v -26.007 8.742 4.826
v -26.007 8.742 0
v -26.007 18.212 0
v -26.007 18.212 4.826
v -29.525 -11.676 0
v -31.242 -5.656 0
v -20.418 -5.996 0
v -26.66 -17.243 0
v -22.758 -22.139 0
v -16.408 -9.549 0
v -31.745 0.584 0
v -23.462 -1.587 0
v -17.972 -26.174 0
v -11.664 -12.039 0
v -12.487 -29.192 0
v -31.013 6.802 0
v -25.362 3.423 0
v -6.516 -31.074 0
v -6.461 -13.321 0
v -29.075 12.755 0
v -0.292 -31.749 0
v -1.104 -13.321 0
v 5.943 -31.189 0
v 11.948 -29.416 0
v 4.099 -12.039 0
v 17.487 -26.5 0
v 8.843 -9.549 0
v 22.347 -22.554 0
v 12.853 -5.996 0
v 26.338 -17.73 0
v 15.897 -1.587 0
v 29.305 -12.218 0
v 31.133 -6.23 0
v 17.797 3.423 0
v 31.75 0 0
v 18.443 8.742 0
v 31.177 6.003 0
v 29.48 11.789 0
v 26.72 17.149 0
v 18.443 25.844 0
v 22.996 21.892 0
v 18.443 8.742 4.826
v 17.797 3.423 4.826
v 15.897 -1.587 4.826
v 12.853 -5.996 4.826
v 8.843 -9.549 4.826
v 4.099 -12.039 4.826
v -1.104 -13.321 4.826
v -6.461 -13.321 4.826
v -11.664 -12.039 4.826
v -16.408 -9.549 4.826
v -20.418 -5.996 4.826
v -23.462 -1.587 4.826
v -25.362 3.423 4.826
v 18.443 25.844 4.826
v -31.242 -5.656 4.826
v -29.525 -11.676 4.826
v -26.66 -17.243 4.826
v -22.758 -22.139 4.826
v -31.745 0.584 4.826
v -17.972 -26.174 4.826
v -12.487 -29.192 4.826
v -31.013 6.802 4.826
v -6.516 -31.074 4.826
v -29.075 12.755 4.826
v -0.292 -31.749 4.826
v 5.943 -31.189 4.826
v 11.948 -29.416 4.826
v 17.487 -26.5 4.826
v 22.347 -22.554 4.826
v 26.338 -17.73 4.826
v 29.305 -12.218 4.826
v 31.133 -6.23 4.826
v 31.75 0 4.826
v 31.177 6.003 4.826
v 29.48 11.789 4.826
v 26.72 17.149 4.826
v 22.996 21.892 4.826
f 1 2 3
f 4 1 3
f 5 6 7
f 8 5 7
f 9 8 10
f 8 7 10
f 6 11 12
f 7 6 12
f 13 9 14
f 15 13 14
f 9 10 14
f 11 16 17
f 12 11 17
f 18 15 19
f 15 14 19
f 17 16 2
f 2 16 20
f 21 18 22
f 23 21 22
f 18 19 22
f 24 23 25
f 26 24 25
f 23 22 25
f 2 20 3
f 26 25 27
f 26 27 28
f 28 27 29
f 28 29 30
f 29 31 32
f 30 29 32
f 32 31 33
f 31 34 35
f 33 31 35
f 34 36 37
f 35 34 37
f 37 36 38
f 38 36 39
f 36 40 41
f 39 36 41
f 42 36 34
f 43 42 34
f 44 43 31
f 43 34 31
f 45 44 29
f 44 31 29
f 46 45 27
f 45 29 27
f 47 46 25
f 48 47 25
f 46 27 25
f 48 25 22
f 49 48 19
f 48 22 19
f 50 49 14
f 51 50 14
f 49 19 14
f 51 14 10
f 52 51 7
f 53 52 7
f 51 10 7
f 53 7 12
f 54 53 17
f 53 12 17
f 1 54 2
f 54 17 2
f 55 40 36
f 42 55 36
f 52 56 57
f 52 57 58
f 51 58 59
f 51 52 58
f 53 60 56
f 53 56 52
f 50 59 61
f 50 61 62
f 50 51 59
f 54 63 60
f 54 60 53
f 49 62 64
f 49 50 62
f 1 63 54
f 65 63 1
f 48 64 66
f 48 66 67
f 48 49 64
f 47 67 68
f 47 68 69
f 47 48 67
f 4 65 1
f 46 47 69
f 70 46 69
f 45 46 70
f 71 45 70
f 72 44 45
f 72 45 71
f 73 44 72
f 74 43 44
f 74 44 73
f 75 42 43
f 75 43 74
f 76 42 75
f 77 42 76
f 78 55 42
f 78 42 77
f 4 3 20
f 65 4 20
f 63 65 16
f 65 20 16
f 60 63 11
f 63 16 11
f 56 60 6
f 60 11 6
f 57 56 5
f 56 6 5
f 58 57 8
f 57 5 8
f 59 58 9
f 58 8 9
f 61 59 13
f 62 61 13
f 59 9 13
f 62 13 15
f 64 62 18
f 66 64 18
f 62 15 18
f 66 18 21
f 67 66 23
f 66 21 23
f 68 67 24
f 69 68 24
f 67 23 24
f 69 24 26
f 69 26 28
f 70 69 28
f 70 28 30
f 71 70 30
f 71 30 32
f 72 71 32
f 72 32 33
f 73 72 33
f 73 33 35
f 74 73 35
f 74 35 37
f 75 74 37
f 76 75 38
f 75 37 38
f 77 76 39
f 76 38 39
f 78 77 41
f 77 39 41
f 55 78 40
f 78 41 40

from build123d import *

# Parameters (mm, degrees)
BOSS_EXTRUDE1_DEPTH = 4.826


with BuildPart() as part:
    # Sketch1 → Boss-Extrude1 (new body)
    with BuildSketch(Plane.XY):
        with BuildLine():
            ThreePointArc((18.442512073, 8.741762413), (-3.782487927, -13.483237587), (-26.007487927, 8.741762413))
            Line((-26.007487927, 8.741762413), (-26.007487927, 18.211893689))
            ThreePointArc((-26.007487927, 18.211893689), (-9.547899201, -30.280358664), (31.75, 0))
            ThreePointArc((31.75, 0), (28.227754589, 14.534661016), (18.442512073, 25.844462626))
            Line((18.442512073, 25.844462626), (18.442512073, 8.741762413))
        make_face()
    extrude(amount=BOSS_EXTRUDE1_DEPTH)


solid = part.part
